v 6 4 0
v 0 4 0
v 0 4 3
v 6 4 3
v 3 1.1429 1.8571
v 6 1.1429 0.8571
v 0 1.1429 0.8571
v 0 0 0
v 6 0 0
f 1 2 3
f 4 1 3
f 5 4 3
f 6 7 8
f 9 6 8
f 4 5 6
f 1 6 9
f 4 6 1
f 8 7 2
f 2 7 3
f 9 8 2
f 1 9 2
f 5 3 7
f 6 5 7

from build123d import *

# Parameters (mm, degrees)
F1_DEPTH  = 6
F11_DEPTH = 6
F12_DEPTH = 25
F13_DEPTH = 25


with BuildPart() as f1:
    # F0 (on Right) → F1 (new body)
    with BuildSketch(Plane.YZ):
        Polygon((4, 3), (0, 0), (4, 0), align=None)
    extrude(amount=F1_DEPTH)

    # F10 (on face) → F11 (join)
    with BuildSketch(Plane.YZ.offset(6)):
        Polygon((1.1428571429, 1.8571428571), (1.1428571429, 0.8571428571), (4, 3), align=None)
    extrude(amount=-F11_DEPTH)

    # F9 (on 3pt) → F12 (cut)
    with BuildSketch(Plane(origin=(0.398340249, -0.8962655602, 1.1950207469), x_dir=(0.9662349396, 0.1545975903, -0.2061301204), z_dir=(-0.2576626506, 0.5797409638, -0.7729879517))):
        Polygon((5.7974096376, -1.4285714286), (2.6925746984, -2.0285714286), (5.7974096376, -5), align=None)
    extrude(amount=-F12_DEPTH, mode=Mode.SUBTRACT)

    # F7 (on 3pt) → F13 (cut)
    with BuildSketch(Plane(origin=(0, 0, 0), x_dir=(0.9662349396, -0.1545975903, 0.2061301204), z_dir=(-0.2576626506, -0.5797409638, 0.7729879517))):
        Polygon((3.1048349393, 2.0285714286), (0, 5), (0, 1.4285714286), align=None)
    extrude(amount=F13_DEPTH, mode=Mode.SUBTRACT)


solid = f1.part
